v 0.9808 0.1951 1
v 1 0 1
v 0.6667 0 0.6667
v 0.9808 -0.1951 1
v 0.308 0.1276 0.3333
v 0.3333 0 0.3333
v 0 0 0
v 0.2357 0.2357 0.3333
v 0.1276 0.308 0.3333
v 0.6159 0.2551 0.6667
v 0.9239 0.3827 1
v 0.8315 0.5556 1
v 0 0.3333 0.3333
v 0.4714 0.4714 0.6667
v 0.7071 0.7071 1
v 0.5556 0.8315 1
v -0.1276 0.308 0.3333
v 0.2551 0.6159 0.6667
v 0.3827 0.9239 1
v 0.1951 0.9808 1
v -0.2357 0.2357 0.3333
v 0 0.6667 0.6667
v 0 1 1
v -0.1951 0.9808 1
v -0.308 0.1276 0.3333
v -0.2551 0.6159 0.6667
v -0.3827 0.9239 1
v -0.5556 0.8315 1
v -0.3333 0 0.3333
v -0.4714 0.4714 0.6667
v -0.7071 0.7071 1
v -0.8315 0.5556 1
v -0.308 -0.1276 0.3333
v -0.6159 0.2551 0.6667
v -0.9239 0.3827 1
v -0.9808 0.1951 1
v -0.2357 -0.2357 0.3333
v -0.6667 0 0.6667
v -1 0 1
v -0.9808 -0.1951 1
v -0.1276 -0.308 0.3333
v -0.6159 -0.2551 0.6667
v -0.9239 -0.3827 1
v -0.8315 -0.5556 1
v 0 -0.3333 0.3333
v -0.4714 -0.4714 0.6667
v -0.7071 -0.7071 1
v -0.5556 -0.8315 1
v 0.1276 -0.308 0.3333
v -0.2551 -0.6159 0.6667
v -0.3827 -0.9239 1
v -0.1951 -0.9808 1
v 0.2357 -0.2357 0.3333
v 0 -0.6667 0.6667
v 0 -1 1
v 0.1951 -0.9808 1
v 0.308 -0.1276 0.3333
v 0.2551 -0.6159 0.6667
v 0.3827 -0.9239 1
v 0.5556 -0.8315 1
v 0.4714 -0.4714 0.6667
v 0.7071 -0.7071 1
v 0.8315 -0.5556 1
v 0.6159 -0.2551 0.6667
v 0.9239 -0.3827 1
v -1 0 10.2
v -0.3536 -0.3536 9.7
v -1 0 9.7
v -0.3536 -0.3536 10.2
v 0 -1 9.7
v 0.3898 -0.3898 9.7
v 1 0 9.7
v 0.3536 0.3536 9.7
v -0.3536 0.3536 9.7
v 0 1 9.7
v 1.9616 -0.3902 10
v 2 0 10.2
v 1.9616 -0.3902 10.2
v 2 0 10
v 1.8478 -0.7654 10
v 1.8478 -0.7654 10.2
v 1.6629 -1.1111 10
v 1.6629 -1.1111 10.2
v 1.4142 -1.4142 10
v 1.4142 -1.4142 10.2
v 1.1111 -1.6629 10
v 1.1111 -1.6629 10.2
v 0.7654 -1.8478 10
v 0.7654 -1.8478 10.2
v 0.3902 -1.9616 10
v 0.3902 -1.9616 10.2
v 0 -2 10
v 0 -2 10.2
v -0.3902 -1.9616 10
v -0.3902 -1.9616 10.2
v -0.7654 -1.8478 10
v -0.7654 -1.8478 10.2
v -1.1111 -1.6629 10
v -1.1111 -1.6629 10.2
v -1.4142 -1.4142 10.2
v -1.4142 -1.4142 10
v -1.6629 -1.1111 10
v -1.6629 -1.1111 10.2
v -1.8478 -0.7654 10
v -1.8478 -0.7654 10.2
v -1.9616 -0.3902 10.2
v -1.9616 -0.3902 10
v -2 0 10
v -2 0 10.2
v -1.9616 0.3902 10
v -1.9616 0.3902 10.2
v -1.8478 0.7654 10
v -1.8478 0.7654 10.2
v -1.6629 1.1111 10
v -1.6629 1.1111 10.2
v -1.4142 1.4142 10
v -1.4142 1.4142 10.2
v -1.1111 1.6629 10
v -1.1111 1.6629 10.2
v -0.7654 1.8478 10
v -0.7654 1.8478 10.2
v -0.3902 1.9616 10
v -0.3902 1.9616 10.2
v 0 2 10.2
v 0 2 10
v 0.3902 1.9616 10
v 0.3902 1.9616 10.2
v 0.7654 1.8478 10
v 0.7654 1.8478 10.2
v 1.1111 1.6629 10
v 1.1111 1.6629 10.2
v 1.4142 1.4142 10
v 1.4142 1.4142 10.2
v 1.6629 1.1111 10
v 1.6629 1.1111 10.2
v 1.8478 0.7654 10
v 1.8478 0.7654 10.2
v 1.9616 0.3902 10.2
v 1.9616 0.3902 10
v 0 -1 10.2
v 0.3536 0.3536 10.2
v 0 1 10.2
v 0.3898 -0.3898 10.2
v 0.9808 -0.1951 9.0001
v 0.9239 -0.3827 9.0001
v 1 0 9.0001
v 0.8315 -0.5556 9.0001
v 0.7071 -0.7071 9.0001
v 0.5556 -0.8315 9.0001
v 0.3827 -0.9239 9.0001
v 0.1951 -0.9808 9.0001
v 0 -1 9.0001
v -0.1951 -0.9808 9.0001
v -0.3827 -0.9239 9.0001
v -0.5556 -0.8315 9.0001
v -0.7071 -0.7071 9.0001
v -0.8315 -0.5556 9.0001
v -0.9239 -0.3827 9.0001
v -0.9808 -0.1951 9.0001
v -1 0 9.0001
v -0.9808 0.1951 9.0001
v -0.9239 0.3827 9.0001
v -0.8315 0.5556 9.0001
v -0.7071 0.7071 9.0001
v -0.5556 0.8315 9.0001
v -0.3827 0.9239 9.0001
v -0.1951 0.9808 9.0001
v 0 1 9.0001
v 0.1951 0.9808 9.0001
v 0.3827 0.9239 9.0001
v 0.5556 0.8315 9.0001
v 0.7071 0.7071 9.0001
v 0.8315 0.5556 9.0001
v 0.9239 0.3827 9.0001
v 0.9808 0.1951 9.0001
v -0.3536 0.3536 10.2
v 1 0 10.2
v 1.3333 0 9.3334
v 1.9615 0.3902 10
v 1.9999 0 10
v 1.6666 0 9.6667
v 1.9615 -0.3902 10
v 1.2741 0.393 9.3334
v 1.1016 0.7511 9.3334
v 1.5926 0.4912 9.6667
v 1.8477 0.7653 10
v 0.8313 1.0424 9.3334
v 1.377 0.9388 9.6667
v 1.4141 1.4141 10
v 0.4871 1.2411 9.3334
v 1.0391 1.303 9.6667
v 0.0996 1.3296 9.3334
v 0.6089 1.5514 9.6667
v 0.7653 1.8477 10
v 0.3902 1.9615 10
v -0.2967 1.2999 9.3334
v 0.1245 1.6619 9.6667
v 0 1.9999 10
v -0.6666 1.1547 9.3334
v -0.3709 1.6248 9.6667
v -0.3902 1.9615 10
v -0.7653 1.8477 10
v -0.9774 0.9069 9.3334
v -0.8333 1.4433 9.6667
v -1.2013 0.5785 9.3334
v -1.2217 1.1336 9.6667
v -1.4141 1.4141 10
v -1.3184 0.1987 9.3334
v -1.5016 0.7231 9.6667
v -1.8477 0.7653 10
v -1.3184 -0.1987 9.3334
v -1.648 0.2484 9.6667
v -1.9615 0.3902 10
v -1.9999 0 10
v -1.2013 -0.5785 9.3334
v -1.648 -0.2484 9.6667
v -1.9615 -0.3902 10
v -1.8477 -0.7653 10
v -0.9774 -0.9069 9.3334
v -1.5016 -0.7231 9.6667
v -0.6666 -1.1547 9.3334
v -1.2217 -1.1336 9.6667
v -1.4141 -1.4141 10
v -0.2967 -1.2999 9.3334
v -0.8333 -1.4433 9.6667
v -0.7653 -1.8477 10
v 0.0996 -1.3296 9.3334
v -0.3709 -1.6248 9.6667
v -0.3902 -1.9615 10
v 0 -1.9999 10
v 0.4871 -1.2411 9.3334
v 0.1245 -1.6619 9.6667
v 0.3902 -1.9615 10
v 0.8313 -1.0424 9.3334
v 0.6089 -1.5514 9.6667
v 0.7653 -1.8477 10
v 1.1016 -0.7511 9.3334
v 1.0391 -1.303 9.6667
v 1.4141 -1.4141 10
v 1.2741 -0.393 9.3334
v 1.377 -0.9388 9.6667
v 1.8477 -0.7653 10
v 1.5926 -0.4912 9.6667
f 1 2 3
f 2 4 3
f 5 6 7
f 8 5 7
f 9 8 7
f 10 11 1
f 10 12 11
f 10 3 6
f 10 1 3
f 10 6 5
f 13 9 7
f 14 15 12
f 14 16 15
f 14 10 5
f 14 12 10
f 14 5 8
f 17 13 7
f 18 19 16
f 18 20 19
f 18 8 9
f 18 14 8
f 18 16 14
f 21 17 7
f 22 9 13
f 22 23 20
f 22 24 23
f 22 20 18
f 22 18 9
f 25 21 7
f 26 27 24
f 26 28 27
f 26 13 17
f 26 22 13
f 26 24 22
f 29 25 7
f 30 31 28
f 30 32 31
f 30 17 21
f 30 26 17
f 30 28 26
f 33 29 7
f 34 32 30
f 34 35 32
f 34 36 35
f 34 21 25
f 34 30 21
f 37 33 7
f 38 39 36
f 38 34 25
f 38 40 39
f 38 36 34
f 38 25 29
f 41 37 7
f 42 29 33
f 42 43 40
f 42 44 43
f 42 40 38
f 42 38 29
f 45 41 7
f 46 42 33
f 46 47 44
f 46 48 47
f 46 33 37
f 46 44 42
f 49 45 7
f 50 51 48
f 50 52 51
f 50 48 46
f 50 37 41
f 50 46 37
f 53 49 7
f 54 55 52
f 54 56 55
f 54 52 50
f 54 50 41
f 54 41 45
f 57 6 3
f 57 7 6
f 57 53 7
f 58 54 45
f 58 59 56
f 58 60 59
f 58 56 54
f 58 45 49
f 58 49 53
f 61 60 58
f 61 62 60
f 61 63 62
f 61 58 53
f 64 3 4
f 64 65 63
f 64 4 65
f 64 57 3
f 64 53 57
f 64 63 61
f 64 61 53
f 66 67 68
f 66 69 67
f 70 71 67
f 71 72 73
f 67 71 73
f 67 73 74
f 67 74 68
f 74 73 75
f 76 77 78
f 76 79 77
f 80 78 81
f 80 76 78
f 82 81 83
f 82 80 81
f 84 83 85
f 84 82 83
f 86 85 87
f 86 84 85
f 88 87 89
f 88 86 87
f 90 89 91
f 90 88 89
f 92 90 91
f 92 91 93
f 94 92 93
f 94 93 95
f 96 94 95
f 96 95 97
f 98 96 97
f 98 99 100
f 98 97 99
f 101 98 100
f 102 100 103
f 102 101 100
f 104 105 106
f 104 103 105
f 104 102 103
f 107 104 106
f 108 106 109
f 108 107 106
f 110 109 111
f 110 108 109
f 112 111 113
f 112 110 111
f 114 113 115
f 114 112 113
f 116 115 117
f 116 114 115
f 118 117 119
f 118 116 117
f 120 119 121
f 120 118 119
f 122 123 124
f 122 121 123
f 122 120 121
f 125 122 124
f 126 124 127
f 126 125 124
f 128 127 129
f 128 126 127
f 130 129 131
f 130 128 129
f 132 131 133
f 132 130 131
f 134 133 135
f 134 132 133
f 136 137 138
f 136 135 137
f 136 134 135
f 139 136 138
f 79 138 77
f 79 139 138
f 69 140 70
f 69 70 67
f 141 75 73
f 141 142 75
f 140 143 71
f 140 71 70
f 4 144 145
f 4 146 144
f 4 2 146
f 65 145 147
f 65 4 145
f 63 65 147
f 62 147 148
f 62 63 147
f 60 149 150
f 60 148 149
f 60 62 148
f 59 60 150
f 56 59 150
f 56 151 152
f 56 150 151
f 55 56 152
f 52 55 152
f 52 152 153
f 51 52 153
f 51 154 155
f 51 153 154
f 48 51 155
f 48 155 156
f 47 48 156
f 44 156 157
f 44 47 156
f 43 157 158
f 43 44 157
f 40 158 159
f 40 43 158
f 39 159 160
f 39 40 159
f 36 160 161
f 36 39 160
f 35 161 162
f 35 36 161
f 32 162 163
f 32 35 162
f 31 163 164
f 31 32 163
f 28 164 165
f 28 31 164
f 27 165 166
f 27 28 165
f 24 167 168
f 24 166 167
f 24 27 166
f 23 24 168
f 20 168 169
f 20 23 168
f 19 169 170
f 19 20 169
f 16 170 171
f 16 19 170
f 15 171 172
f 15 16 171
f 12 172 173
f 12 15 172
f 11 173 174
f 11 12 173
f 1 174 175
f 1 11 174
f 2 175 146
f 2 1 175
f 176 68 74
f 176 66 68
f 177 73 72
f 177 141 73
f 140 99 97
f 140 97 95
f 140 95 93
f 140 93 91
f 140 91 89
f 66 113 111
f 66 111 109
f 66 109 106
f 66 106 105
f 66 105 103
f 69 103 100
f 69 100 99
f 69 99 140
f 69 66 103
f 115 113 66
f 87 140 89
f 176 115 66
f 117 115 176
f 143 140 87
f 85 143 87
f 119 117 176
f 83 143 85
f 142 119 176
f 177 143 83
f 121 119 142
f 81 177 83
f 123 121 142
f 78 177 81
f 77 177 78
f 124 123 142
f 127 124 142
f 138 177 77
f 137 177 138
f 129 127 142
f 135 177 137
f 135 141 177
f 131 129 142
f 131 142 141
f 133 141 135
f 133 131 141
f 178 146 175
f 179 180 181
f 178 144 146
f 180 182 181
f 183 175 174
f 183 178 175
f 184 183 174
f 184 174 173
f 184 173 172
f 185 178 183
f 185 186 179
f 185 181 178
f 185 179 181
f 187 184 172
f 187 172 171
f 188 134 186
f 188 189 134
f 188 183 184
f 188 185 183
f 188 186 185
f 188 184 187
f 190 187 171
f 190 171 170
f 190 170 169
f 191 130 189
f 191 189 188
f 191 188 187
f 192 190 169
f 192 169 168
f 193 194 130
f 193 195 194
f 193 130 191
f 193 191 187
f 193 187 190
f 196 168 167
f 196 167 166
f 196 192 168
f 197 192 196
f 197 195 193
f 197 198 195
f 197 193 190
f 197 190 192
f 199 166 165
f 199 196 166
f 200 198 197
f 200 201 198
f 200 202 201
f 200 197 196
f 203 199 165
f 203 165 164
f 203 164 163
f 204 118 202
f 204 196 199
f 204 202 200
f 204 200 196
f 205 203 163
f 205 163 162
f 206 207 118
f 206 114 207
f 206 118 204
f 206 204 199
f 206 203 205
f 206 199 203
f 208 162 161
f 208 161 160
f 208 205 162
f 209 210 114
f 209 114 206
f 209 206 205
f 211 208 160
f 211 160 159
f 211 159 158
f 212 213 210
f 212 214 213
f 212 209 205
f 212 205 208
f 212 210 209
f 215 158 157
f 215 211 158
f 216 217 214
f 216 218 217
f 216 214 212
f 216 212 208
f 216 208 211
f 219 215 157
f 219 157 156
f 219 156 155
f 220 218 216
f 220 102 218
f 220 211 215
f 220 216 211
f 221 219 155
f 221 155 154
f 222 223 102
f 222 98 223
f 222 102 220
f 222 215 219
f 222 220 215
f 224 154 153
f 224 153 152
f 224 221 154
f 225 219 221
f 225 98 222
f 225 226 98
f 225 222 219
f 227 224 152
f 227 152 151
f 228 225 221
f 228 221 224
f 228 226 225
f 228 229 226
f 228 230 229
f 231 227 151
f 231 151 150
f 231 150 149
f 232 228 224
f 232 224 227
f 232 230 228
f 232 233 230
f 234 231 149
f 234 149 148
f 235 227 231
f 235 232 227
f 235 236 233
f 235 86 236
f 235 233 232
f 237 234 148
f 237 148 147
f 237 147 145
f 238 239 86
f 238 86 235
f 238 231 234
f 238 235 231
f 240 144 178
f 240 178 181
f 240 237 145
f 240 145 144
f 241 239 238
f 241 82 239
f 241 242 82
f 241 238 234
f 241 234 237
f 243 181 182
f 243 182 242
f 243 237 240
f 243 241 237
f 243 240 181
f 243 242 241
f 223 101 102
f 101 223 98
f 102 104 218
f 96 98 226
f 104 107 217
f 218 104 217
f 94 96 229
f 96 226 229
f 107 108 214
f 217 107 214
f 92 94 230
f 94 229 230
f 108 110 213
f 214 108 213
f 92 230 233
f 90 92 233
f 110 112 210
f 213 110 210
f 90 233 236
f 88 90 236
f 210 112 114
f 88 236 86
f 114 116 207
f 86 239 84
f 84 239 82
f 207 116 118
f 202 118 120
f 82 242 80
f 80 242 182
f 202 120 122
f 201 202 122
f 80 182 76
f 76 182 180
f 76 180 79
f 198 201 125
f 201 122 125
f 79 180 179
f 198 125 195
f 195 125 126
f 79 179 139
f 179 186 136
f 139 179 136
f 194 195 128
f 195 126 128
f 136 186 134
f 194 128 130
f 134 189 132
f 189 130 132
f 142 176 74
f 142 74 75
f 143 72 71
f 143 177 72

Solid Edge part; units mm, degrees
sketch "Sketch1" plane through (0, 0, 0) normal (0, 0, 1) x (1, 0, 0)
  circle A0 centre (0, 0) radius 1
extrude "Protrusion1" add sketch "Sketch1" along normal blind 10
sketch "Sketch2" plane through (0, 0, 10) normal (0, 0, 1) x (1, 0, 0)
  circle A0 centre (0, 0) radius 2
extrude "ProtrusiónExtruida_2" add sketch "Sketch2" along normal blind 0.2
chamfer "Chaflán_2" distance 1 angle 45 1 edges at (1, 0, 10)
sketch "Sketch3" plane through (0, 0, 10.2) normal (0, 0, 1) x (1, 0, 0)
  line L0 (0, -1) -> (-0.3536, -0.3536)
  line L1 (-0.3536, -0.3536) -> (-1, 0)
  line L2 (-1, 0) -> (-0.3536, 0.3536)
  line L3 (-0.3536, 0.3536) -> (0, 1)
  line L4 (0, 1) -> (0.3536, 0.3536)
  line L5 (0.3536, 0.3536) -> (1, 0)
  line L6 (1, 0) -> (0.3898, -0.3898)
  line L7 (0.3898, -0.3898) -> (0, -1)
extrude "VaciadoExtruido_1" cut sketch "Sketch3" against normal blind 0.5
chamfer "Chaflán_1" distance 1 angle 45 1 edges at (-1, 0, 0)
properties material "Latón, amarillo"
